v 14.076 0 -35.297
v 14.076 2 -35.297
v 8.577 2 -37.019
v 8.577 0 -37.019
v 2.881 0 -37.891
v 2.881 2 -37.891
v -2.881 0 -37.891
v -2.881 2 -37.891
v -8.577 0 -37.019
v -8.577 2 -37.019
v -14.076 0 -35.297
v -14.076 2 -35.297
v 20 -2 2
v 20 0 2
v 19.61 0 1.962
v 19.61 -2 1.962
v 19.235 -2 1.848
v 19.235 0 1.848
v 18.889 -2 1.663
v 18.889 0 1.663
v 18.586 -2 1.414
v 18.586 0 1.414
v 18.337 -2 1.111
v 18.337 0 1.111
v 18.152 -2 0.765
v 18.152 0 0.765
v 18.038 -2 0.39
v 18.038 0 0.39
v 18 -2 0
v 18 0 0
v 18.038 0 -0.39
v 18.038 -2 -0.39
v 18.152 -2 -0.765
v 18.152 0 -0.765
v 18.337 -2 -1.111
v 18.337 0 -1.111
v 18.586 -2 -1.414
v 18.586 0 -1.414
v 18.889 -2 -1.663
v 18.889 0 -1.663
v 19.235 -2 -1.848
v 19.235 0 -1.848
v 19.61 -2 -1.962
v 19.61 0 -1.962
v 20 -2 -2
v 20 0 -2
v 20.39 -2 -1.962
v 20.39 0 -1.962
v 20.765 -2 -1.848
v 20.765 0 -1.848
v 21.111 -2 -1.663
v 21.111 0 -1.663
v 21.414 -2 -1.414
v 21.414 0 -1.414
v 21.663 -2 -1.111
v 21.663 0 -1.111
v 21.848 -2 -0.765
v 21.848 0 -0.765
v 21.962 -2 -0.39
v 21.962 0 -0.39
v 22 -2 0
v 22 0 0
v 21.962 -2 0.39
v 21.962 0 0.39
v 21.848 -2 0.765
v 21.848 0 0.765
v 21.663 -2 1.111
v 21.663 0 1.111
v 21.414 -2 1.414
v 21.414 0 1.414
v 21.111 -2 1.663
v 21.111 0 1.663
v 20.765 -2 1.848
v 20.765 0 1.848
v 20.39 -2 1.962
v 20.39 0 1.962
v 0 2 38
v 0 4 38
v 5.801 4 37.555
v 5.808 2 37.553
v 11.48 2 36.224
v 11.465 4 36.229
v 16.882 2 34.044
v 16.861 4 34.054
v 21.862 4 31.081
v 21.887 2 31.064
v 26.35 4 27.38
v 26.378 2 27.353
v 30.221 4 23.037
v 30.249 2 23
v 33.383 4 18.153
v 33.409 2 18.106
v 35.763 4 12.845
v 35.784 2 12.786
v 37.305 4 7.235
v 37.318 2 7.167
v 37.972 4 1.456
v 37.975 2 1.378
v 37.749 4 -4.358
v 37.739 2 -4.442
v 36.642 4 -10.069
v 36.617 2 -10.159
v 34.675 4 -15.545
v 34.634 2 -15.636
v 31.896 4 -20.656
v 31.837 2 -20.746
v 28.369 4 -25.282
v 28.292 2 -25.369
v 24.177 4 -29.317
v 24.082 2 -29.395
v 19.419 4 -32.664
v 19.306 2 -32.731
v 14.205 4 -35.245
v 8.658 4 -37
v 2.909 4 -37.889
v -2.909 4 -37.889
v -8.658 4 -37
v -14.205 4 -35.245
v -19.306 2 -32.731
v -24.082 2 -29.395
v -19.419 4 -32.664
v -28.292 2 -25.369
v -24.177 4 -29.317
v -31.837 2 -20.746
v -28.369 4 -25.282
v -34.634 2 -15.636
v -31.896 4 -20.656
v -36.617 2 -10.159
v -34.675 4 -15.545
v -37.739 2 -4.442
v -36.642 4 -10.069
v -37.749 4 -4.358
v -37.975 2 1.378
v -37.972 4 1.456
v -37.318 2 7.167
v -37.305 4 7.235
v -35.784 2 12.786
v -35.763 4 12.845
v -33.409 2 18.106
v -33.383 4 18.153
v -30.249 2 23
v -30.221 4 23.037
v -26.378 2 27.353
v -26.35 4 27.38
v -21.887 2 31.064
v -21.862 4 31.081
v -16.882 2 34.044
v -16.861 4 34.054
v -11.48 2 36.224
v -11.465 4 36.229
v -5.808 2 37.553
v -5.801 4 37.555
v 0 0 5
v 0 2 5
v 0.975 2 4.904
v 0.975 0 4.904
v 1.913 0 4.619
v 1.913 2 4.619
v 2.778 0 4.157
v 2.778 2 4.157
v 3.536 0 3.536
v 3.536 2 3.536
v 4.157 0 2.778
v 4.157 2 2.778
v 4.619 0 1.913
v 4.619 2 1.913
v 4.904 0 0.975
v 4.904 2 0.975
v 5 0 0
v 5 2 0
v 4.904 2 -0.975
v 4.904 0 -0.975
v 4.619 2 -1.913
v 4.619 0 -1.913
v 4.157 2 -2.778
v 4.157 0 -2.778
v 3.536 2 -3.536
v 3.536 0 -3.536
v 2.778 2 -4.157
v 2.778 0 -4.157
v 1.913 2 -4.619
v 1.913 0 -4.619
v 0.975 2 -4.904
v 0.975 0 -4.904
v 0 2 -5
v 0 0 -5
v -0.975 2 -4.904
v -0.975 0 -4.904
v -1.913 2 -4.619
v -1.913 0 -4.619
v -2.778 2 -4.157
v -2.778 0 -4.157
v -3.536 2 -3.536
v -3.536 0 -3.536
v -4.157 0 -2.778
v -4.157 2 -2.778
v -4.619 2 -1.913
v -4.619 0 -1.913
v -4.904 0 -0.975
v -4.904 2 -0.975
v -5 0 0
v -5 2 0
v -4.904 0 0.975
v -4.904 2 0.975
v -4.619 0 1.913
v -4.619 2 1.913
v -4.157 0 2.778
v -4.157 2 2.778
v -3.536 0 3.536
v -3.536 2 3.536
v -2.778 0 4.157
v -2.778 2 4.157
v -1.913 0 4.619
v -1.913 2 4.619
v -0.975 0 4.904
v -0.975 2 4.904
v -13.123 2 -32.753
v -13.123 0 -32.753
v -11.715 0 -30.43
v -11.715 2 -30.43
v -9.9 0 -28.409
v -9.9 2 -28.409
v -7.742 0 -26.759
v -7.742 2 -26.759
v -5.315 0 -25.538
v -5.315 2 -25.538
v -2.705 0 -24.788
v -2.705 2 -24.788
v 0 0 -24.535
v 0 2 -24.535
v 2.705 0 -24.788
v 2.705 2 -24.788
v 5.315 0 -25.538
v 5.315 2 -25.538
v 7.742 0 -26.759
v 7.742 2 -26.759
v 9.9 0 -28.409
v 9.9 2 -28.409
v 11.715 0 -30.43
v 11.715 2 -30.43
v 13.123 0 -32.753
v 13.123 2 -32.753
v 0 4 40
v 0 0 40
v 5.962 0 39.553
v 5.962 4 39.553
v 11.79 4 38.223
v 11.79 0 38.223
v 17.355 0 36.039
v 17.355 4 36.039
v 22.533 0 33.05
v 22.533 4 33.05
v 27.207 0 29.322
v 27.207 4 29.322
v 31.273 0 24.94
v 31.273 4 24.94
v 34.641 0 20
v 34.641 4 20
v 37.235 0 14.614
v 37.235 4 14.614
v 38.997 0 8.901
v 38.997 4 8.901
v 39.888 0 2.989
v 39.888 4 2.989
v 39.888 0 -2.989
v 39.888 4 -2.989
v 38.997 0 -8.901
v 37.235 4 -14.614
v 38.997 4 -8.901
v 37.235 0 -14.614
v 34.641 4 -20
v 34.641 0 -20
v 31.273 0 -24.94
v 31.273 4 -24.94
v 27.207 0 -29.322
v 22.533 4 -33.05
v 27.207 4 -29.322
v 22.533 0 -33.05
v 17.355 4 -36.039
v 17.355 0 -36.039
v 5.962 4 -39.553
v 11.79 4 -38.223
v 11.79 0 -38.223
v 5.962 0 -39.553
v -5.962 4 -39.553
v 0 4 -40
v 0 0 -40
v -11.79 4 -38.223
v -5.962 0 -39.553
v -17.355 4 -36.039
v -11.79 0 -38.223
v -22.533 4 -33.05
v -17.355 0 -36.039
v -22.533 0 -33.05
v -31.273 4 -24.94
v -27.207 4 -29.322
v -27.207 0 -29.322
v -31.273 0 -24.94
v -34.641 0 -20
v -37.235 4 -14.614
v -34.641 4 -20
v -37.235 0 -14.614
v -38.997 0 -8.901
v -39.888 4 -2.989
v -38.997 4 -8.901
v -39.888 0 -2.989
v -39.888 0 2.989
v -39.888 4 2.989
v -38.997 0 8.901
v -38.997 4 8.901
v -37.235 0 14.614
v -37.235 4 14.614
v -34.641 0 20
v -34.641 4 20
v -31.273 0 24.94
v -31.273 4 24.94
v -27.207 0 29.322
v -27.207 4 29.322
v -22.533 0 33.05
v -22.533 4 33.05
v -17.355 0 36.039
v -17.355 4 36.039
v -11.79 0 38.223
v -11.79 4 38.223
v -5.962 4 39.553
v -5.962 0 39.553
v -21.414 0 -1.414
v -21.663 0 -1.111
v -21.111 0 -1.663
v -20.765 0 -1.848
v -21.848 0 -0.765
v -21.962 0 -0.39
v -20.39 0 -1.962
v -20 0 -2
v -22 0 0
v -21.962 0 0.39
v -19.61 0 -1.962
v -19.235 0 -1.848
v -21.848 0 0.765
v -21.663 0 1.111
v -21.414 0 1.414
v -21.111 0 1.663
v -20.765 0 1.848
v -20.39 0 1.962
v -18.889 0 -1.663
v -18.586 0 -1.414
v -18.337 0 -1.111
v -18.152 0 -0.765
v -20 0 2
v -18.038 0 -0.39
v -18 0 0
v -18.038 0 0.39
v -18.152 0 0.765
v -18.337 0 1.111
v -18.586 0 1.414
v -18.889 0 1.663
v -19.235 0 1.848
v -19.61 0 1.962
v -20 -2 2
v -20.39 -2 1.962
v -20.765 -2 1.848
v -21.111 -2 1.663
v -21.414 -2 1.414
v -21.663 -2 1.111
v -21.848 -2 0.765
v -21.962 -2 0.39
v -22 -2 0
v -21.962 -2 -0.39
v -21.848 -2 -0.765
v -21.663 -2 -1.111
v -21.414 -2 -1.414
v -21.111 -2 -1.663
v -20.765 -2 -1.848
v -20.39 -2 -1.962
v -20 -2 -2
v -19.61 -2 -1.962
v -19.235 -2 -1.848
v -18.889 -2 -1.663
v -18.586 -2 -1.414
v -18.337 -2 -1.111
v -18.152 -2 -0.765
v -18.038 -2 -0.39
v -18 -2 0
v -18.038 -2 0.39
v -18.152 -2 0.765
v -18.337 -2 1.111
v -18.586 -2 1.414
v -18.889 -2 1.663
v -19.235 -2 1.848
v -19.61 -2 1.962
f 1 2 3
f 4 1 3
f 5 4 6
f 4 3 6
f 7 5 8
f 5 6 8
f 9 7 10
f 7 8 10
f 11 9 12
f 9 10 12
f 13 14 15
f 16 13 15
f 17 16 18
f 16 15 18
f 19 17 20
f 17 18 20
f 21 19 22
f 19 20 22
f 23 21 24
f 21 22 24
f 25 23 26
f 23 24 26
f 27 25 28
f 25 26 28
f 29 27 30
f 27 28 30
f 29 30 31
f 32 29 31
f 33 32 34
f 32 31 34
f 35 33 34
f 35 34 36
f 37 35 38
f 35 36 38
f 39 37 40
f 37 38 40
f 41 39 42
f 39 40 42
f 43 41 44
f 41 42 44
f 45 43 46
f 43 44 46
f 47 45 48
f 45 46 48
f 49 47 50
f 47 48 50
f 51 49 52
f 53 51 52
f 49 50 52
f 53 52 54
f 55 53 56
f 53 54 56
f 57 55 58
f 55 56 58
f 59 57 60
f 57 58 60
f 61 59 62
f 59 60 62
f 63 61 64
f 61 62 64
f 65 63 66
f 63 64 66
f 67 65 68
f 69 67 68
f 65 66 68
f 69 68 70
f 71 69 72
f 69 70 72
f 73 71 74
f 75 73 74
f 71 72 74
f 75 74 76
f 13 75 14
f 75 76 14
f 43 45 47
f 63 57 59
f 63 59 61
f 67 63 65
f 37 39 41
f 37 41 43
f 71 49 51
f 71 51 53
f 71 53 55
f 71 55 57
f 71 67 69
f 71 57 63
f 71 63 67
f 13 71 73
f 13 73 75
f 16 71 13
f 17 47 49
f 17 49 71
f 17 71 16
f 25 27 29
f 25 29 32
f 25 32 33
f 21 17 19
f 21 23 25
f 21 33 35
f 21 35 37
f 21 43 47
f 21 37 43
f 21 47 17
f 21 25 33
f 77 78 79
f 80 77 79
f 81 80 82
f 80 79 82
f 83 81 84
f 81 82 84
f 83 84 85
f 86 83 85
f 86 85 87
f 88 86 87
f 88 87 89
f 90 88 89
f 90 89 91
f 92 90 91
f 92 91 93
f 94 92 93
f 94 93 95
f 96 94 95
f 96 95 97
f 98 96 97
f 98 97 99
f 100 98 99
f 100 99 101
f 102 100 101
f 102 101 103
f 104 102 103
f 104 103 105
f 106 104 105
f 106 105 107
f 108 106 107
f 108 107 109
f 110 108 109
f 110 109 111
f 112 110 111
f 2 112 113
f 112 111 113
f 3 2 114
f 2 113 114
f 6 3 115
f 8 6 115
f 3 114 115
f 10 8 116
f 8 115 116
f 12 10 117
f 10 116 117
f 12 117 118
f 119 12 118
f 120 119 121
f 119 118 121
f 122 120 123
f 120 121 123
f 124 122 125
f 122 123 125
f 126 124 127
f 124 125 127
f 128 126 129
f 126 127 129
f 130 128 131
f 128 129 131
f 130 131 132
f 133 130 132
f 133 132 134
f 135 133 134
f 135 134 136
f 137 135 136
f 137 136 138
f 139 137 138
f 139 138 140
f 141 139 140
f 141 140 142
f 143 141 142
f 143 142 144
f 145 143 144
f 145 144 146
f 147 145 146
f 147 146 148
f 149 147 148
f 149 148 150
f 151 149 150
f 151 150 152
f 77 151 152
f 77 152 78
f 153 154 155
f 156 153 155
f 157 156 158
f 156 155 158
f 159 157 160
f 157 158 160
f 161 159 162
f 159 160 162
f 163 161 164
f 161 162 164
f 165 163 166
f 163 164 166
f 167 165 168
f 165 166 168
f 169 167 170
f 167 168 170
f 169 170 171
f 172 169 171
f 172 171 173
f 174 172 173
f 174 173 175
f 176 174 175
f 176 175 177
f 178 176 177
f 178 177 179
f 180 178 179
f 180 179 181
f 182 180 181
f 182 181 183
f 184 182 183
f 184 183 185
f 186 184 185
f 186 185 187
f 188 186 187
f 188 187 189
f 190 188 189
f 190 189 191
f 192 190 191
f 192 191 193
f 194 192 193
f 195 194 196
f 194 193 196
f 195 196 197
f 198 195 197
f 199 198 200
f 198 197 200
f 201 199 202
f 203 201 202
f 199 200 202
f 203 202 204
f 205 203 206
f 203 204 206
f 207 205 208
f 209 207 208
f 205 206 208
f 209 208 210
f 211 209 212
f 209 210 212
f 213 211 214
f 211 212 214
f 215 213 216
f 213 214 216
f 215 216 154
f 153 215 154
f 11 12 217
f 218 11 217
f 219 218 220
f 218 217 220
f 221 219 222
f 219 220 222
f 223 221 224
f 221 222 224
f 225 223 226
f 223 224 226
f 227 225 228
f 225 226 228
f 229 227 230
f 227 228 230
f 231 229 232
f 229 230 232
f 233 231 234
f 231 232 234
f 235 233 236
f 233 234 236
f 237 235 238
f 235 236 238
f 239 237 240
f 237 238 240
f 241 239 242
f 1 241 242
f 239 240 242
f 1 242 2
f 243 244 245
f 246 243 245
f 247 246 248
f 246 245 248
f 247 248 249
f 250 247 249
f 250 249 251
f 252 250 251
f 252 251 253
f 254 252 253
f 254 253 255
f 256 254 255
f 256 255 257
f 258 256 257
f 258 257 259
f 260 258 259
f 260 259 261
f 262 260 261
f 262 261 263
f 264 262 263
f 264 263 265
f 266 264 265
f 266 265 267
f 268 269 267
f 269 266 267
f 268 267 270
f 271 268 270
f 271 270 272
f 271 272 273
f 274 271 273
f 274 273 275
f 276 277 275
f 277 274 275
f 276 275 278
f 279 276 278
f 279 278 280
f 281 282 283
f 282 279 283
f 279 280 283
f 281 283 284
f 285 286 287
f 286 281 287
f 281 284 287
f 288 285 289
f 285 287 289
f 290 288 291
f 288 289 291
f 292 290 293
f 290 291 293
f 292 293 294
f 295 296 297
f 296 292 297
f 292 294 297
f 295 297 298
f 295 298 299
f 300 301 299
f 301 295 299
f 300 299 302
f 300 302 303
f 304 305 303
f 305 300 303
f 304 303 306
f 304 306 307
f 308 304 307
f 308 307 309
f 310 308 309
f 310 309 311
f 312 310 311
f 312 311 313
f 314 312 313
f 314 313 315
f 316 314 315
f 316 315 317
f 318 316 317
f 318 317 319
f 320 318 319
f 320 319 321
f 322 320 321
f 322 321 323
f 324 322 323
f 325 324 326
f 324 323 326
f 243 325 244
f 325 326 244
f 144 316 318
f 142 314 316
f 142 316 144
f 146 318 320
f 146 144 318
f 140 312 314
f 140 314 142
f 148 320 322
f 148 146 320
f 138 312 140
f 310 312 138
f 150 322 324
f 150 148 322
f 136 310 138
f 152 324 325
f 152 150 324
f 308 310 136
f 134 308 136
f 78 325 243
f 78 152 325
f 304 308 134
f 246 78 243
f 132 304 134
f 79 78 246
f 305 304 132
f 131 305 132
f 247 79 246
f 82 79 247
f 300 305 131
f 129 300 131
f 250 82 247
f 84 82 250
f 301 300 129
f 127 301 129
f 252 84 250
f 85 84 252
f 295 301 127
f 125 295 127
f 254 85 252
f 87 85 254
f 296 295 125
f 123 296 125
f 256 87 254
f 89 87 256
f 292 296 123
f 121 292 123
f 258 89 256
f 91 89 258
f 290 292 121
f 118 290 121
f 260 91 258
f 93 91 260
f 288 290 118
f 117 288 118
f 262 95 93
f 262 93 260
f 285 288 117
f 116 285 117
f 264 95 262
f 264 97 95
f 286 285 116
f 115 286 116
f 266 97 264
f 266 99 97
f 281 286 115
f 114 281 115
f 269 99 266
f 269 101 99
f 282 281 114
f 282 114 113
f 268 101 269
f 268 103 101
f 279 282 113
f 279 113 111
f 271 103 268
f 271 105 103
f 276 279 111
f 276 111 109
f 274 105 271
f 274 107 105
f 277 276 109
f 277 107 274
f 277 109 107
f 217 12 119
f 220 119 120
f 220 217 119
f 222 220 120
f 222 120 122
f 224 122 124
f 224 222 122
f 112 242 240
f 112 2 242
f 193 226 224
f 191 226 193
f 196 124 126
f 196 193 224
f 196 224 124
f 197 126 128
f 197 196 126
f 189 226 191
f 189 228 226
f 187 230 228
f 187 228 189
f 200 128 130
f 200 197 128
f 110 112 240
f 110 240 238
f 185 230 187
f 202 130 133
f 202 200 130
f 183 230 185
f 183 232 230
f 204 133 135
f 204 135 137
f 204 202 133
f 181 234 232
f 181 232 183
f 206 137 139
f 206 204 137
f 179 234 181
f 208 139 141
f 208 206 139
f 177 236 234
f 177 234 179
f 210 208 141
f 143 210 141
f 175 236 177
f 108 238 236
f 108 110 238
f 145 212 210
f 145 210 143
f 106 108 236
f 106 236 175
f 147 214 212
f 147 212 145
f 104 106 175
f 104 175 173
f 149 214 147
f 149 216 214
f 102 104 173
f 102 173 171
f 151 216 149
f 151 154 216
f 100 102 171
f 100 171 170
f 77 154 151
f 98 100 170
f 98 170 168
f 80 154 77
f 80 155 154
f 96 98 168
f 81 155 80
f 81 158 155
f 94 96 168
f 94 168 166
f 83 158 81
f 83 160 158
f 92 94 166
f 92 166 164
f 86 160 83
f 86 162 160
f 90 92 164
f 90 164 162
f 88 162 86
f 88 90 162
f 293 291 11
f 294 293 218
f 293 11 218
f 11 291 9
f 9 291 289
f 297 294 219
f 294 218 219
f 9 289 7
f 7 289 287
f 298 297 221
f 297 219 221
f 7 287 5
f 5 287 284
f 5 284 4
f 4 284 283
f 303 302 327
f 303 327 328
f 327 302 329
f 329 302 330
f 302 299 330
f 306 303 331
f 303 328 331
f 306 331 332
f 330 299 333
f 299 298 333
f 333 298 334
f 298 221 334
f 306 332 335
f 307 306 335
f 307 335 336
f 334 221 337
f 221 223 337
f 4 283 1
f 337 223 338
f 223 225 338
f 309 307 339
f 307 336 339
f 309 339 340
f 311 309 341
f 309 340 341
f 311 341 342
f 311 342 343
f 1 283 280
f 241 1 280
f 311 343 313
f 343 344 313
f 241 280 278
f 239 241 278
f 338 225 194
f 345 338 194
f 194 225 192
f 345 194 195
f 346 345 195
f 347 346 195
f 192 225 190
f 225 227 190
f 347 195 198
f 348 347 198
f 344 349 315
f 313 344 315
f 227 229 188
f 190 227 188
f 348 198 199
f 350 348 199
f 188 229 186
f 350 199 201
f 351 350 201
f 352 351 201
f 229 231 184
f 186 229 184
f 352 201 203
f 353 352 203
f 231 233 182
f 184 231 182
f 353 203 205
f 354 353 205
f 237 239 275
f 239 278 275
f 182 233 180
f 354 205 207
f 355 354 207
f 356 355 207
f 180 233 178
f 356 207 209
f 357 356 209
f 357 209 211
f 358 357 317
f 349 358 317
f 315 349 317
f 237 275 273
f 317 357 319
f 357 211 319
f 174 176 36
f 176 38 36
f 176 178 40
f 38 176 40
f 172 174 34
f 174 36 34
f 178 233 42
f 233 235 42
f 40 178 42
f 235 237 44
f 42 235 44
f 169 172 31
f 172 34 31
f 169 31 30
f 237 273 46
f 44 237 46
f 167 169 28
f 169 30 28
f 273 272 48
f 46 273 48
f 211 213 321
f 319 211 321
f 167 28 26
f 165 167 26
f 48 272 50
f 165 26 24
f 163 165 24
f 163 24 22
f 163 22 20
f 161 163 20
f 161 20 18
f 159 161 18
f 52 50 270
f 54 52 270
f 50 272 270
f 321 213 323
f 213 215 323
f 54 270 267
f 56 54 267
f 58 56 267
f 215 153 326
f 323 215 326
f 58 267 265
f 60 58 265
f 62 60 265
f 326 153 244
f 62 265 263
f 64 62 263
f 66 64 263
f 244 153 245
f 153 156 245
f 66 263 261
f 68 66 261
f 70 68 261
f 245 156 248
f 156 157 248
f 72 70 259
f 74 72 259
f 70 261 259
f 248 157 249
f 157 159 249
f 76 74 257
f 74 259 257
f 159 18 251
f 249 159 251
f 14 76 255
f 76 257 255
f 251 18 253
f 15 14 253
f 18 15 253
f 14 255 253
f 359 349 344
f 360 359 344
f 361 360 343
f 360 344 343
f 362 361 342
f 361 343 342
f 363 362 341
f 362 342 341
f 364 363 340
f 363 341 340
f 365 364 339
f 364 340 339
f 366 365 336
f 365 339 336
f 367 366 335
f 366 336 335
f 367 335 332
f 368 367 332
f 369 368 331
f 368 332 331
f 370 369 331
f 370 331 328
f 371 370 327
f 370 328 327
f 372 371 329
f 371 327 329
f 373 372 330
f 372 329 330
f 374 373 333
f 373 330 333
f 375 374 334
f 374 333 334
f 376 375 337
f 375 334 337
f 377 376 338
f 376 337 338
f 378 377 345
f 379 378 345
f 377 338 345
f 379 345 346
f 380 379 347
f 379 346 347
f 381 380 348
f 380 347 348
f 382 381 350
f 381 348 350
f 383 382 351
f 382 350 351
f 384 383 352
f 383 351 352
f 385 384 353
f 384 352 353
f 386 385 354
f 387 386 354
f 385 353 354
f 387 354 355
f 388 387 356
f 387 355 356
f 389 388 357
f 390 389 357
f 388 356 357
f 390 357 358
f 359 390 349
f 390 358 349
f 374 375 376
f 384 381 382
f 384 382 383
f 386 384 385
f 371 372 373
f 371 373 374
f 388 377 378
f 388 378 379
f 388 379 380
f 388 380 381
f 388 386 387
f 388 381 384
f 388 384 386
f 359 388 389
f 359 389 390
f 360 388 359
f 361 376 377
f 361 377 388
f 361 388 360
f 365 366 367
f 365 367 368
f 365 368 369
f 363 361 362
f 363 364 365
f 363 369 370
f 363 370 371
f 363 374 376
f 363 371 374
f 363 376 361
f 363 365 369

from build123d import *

# Parameters (mm, degrees)
SKETCH1_R           = 40
BOSS_EXTRUDE1_DEPTH = 40
SKETCH2_R           = 38
CUT_EXTRUDE1_DEPTH  = 38
CUT_EXTRUDE2_DEPTH  = 38
SKETCH4_R           = 5
CUT_EXTRUDE3_DEPTH  = 38
SKETCH6_R           = 2
BOSS_EXTRUDE2_DEPTH = 2
SKETCH8_R           = 43.496918112
CUT_EXTRUDE4_DEPTH  = 36


with BuildPart() as part:
    # Sketch1 → Boss-Extrude1 (new body)
    with BuildSketch(Plane(origin=(0, 0, 0), x_dir=(1, 0, 0), z_dir=(0, 1, 0))):
        with Locations(Location((0, 0, 0), (0, 0, 270))):
            Circle(SKETCH1_R)
    extrude(amount=BOSS_EXTRUDE1_DEPTH)

    # Sketch2 → Cut-Extrude1 (cut)
    with BuildSketch(Plane(origin=(0, 40, 0), x_dir=(1, 0, 0), z_dir=(0, 1, 0))):
        with Locations(Location((0, 0, 0), (0, 0, 270))):
            Circle(SKETCH2_R)
    extrude(amount=-CUT_EXTRUDE1_DEPTH, mode=Mode.SUBTRACT)

    # Sketch3 → Cut-Extrude2 (cut)
    with BuildSketch(Plane(origin=(0, 2, 0), x_dir=(1, 0, 0), z_dir=(0, 1, 0))):
        with BuildLine():
            ThreePointArc((-14.076066703, 35.296803626), (0, 24.534862453), (14.076066703, 35.296803626))
            ThreePointArc((14.076066703, 35.296803626), (0, 38), (-14.076066703, 35.296803626))
        make_face()
    extrude(amount=-CUT_EXTRUDE2_DEPTH, mode=Mode.SUBTRACT)

    # Sketch4 → Cut-Extrude3 (cut)
    with BuildSketch(Plane(origin=(0, 2, 0), x_dir=(1, 0, 0), z_dir=(0, 1, 0))):
        with Locations(Location((0, 0, 0), (0, 0, 270))):
            Circle(SKETCH4_R)
    extrude(amount=-CUT_EXTRUDE3_DEPTH, mode=Mode.SUBTRACT)

    # Sketch6 → Boss-Extrude2 (add)
    with BuildSketch(Plane.XZ):
        with Locations(Location((-20, 0, 0), (0, 0, 90))):
            Circle(SKETCH6_R)
        with Locations(Location((20, 0, 0), (0, 0, 90))):
            Circle(SKETCH6_R)
    extrude(amount=BOSS_EXTRUDE2_DEPTH)

    # Sketch8 → Cut-Extrude4 (cut)
    with BuildSketch(Plane(origin=(0, 40, 0), x_dir=(1, 0, 0), z_dir=(0, 1, 0))):
        Circle(SKETCH8_R)
    extrude(amount=-CUT_EXTRUDE4_DEPTH, mode=Mode.SUBTRACT)


solid = part.part
